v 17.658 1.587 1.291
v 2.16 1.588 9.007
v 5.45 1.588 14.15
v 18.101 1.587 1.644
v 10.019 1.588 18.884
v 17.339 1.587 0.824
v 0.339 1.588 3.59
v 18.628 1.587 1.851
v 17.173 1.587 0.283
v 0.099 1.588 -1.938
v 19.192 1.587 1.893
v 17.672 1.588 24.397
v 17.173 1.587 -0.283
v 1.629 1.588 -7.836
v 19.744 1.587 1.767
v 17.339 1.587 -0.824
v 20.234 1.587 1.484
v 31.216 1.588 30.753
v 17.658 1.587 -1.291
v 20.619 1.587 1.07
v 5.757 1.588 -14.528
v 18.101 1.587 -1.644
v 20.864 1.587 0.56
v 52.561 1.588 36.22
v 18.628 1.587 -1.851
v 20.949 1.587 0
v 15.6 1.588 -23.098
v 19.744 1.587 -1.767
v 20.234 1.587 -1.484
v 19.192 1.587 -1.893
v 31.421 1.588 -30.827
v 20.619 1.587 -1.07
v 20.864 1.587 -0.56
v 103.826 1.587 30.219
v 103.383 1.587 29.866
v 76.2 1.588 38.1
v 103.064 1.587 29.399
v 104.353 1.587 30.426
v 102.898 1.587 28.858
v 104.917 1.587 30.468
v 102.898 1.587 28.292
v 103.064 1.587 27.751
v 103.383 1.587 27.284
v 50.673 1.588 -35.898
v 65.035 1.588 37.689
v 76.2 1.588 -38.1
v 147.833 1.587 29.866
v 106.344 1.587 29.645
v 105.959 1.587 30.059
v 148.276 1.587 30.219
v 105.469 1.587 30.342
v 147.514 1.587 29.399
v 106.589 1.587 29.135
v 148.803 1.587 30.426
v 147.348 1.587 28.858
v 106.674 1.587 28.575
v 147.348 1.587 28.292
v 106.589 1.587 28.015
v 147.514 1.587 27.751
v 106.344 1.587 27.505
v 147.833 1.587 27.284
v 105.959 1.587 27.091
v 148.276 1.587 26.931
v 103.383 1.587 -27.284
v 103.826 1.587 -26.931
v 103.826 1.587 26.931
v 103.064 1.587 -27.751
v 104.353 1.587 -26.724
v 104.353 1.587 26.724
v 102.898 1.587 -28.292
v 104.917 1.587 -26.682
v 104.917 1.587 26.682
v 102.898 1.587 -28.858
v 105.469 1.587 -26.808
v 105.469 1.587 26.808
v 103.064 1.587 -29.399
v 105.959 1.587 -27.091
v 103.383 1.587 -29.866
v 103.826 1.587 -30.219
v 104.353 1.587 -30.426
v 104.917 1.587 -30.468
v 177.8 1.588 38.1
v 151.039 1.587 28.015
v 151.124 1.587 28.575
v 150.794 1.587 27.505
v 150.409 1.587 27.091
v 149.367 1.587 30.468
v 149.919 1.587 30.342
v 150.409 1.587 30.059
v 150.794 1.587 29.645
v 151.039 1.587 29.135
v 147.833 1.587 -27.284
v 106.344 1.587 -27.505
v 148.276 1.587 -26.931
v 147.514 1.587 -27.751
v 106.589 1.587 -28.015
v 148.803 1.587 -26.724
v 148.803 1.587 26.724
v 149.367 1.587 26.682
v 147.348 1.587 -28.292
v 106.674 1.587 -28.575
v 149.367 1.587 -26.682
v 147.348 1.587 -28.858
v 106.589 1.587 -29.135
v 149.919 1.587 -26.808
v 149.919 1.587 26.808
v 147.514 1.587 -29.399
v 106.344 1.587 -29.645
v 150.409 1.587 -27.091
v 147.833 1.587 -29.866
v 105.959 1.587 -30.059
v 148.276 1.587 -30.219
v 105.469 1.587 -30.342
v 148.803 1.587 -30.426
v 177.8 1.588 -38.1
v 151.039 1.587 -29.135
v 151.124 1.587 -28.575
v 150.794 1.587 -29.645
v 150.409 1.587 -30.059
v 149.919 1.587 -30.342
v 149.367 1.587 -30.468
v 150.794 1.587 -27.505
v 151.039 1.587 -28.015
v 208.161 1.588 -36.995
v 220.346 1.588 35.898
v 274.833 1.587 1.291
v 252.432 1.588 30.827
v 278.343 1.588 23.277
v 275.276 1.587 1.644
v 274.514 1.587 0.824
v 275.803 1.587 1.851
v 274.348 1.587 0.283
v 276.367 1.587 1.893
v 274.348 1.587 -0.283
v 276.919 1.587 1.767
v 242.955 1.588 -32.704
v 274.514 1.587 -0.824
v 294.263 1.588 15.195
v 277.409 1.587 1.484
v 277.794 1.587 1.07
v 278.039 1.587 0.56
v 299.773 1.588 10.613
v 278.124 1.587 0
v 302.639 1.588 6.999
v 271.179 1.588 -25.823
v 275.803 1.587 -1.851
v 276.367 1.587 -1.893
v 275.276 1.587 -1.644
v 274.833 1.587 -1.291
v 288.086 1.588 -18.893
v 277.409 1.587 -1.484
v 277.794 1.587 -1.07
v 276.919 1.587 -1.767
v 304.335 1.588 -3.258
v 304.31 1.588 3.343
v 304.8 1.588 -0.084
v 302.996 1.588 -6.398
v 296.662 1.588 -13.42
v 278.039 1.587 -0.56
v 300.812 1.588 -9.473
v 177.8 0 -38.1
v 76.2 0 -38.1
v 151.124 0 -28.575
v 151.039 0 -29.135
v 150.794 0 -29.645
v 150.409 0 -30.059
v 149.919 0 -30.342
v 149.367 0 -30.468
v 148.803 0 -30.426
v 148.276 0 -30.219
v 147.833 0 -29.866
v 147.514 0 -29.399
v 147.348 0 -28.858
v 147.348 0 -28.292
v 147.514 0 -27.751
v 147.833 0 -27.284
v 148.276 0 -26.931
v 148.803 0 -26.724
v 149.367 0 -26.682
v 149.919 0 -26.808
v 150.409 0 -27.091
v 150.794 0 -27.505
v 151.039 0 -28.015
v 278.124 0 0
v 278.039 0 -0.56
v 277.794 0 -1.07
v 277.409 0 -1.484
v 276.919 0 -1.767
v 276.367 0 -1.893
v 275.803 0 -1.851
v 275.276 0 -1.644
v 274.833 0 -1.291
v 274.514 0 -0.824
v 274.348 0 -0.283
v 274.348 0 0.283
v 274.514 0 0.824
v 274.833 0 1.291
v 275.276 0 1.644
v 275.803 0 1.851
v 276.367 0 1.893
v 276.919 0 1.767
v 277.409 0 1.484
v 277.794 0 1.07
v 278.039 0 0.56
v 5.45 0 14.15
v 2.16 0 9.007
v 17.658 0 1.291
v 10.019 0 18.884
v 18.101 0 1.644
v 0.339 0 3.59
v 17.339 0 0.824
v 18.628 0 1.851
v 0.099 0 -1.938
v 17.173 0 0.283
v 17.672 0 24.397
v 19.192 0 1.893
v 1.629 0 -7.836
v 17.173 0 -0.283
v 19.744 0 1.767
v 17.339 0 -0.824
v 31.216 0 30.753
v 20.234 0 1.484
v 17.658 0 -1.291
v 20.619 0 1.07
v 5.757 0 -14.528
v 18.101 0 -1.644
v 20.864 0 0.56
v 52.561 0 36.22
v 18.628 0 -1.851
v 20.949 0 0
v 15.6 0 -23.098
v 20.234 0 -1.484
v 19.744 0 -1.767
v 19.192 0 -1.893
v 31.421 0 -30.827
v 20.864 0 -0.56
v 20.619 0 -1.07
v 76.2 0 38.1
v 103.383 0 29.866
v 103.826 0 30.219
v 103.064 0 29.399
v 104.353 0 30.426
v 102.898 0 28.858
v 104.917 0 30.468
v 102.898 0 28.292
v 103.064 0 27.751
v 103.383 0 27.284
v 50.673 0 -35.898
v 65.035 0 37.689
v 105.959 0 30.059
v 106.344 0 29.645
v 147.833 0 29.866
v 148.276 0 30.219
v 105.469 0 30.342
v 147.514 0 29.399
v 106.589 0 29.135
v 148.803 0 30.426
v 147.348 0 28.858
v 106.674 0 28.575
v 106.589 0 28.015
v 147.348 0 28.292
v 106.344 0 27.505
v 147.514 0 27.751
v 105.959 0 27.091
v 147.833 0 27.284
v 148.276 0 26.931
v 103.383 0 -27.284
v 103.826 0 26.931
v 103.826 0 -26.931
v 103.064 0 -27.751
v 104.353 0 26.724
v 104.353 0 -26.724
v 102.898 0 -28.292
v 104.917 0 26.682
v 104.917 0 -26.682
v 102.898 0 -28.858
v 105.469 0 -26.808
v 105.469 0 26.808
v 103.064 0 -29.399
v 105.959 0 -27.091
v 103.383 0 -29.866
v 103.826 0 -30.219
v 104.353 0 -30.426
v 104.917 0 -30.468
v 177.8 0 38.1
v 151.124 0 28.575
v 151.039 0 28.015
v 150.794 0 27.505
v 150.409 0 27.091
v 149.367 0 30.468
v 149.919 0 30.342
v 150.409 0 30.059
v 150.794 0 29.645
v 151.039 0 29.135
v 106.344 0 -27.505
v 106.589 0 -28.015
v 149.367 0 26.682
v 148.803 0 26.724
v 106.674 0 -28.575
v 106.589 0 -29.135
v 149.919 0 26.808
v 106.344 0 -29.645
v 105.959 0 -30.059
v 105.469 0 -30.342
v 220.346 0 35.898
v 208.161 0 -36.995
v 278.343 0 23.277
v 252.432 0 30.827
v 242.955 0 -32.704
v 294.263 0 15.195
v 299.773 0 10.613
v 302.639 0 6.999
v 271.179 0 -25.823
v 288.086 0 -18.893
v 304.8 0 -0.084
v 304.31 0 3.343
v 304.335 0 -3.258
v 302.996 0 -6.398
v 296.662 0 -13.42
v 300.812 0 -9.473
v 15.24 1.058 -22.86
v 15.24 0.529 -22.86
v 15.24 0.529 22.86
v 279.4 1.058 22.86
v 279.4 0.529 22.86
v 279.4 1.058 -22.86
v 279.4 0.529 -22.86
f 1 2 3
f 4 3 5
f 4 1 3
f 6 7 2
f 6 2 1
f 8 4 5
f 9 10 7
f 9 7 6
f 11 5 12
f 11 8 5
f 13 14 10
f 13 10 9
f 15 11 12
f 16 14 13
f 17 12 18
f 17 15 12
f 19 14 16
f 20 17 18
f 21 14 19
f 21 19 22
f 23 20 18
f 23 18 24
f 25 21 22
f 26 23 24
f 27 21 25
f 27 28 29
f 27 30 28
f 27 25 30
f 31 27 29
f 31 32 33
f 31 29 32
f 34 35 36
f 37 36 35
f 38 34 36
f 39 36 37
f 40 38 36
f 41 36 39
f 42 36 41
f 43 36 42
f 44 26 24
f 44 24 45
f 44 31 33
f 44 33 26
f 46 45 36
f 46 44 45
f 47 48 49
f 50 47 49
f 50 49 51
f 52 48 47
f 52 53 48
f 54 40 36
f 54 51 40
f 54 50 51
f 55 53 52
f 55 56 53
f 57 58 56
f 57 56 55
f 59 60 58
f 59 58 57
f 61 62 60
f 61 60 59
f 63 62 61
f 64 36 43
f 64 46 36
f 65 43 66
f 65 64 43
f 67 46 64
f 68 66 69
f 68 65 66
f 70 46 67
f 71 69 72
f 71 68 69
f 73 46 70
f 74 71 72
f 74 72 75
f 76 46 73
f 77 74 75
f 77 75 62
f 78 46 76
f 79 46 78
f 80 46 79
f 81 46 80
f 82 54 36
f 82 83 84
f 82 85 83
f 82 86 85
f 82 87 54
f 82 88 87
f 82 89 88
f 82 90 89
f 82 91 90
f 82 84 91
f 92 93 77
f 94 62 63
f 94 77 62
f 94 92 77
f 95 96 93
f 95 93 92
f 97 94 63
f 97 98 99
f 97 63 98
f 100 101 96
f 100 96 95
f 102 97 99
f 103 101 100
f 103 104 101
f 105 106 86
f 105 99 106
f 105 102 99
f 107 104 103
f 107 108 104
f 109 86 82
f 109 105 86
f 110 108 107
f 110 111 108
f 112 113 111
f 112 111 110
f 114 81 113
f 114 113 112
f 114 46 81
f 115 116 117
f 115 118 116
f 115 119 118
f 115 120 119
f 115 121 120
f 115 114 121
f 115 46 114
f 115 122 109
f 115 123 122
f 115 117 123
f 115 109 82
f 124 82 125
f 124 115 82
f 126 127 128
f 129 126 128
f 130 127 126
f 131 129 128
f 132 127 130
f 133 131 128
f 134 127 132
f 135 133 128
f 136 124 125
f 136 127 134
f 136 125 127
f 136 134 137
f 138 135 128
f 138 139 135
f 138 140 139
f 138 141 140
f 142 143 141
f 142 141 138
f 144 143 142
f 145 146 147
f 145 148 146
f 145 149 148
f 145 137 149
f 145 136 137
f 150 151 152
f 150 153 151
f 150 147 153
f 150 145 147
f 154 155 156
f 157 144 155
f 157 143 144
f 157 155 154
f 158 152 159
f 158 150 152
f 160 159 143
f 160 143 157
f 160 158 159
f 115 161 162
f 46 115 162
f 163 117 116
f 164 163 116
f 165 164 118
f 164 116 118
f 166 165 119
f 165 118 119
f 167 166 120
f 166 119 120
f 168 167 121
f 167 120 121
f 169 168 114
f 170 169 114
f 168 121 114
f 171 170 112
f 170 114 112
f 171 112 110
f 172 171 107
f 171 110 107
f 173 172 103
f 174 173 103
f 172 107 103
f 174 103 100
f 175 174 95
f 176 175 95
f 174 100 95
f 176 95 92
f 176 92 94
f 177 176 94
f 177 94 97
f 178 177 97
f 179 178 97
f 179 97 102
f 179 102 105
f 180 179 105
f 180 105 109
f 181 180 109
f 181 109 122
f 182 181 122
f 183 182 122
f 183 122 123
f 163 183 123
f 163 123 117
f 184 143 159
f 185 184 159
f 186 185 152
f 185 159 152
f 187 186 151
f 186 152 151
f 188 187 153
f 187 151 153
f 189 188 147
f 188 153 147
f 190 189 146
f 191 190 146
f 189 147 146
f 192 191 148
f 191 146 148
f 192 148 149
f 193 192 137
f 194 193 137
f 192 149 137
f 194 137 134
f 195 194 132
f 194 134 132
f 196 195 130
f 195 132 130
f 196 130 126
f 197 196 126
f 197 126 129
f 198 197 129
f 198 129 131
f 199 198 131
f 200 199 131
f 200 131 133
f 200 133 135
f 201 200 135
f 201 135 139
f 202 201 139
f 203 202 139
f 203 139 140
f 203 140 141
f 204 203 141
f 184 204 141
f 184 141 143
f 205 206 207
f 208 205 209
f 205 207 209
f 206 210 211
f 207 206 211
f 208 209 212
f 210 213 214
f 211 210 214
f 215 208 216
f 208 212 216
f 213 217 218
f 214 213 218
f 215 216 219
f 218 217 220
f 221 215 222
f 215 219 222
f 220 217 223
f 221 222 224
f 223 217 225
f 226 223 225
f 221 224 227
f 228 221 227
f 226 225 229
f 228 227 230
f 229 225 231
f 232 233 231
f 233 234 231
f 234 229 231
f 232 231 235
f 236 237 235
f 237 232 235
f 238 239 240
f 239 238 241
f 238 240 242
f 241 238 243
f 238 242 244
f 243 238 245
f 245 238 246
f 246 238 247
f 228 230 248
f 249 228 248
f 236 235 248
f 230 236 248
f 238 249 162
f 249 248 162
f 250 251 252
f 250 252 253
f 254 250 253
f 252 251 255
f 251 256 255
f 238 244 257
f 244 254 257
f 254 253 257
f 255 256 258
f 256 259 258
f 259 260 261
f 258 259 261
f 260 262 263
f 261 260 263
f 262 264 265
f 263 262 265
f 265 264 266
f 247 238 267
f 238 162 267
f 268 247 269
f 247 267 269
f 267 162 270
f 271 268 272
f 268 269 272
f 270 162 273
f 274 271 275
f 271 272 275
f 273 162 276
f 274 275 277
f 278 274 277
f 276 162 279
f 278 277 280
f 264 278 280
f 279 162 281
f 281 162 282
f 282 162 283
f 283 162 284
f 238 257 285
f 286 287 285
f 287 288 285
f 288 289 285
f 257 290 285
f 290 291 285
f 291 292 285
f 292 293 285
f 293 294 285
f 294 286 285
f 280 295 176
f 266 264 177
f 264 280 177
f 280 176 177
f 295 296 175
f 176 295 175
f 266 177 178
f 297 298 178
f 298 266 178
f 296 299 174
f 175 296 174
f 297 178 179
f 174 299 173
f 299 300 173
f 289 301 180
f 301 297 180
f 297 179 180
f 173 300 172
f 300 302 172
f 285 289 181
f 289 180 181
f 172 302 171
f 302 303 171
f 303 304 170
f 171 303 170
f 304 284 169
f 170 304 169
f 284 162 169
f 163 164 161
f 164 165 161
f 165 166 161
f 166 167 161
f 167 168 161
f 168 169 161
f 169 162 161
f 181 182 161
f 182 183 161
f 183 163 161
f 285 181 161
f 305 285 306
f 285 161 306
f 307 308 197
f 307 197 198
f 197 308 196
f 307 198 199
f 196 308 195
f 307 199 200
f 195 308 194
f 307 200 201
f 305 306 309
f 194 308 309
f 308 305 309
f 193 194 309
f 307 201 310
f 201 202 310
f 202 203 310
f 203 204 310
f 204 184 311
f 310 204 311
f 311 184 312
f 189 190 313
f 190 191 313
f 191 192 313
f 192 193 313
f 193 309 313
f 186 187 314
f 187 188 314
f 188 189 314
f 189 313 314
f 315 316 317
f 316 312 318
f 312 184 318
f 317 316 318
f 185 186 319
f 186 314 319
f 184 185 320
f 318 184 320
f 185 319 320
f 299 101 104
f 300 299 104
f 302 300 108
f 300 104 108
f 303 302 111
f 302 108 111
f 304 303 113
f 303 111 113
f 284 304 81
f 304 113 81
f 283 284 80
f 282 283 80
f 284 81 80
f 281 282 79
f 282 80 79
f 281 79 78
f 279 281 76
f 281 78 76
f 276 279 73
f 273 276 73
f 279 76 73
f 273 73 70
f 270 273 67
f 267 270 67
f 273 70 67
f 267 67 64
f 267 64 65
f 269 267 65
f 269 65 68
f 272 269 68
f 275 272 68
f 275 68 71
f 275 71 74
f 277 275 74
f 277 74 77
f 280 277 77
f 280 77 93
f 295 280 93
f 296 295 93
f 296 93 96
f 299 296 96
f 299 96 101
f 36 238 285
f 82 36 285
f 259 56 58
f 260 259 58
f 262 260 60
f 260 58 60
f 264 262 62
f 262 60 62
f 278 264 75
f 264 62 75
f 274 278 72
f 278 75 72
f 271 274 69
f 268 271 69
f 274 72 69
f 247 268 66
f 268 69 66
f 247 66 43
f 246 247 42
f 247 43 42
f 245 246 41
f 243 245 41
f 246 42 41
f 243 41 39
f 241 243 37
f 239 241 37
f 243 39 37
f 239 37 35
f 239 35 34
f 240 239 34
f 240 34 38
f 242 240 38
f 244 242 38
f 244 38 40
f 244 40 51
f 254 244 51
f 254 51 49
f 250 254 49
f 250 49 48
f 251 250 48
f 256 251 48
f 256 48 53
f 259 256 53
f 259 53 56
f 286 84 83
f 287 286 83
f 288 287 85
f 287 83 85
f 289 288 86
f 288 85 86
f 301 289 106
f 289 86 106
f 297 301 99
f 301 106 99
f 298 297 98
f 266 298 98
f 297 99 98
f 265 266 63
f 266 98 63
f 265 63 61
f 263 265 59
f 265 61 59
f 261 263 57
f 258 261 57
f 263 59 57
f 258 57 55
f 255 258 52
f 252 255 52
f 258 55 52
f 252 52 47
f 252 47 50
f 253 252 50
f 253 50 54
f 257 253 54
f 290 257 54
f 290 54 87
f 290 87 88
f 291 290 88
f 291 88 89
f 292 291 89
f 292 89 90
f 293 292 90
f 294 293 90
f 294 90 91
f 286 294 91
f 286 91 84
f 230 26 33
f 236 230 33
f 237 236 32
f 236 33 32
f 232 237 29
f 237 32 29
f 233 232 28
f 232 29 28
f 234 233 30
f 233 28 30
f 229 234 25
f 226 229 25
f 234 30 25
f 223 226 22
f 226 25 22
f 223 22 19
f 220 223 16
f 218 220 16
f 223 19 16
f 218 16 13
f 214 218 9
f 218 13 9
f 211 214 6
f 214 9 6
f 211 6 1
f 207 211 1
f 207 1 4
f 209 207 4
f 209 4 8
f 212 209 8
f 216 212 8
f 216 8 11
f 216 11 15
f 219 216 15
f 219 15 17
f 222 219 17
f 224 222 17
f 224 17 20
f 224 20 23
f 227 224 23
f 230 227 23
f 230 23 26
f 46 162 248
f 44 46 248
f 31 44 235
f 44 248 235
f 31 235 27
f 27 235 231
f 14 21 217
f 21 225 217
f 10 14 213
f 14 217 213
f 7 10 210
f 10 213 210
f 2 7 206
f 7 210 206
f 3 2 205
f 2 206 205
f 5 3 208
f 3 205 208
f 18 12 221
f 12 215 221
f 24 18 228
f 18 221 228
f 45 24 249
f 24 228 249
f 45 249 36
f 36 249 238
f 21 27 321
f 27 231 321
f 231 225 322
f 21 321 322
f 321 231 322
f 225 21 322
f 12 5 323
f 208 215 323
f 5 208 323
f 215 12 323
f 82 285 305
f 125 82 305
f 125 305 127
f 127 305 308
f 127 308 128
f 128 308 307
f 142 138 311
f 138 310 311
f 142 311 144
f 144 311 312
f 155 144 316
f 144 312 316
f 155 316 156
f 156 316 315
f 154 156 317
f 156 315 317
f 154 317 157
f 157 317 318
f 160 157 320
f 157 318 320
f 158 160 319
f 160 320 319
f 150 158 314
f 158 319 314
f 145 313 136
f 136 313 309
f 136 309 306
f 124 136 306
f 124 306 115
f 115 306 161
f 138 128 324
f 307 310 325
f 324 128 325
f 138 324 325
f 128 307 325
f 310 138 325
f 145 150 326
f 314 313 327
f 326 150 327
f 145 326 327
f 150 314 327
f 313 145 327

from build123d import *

# Parameters (mm, degrees)
BOSS_EXTRUDE1_DEPTH       = 1.5875
F_6_CLEARANCE_HOLE1_D     = 3.7973
F_6_CLEARANCE_HOLE2_D     = 3.7973
F_6_CLEARANCE_HOLE2_DEPTH = 25.4
F_6_CLEARANCE_HOLE2_TIP   = 1.140824014
F_6_CLEARANCE_HOLE3_D     = 3.7973
F_6_CLEARANCE_HOLE3_DEPTH = 25.4
F_6_CLEARANCE_HOLE3_TIP   = 1.140824014


with BuildPart() as part:
    # Sketch11 → Boss-Extrude1 (new body)
    with BuildSketch(Plane(origin=(0, 0, 0), x_dir=(1, 0, 0), z_dir=(0, 1, 0))):
        with BuildLine():
            Line((177.8, 38.1), (76.2, 38.1))
            add(Edge.make_bspline(
                [(76.2, 38.1), (-76.2, 38.1), (-76.2, -38.1), (76.2, -38.1)],
                knots=[0, 0, 0, 0, 1, 1, 1, 1], degree=3, weights=[1, 0.333333333, 0.333333333, 1]))
            Line((76.2, -38.1), (177.8, -38.1))
            add(Edge.make_bspline(
                [(177.8, -38.1), (431.8, -38.1), (431.8, 38.1), (177.8, 38.1)],
                knots=[0, 0, 0, 0, 1, 1, 1, 1], degree=3, weights=[1, 0.333333333, 0.333333333, 1]))
        make_face()
    extrude(amount=BOSS_EXTRUDE1_DEPTH)

    # #6 Clearance Hole1 (through all)
    with Locations(Plane(origin=(0, 0, 0), x_dir=(-1, 0, 0), z_dir=(0, -1, 0))):
        with Locations((-104.775, -28.575), (-149.225, -28.575), (-149.225, 28.575), (-104.775, 28.575)):
            Hole(F_6_CLEARANCE_HOLE1_D / 2)

    # #6 Clearance Hole2
    with Locations(Plane(origin=(0, 0, 0), x_dir=(-1, 0, 0), z_dir=(0, -1, 0))):
        with Locations((-19.05, 0)):
            Hole(F_6_CLEARANCE_HOLE2_D / 2, depth=F_6_CLEARANCE_HOLE2_DEPTH)
            with Locations((0, 0, -(F_6_CLEARANCE_HOLE2_DEPTH + F_6_CLEARANCE_HOLE2_TIP / 2))):  # 118° drill point
                Cone(0, F_6_CLEARANCE_HOLE2_D / 2, F_6_CLEARANCE_HOLE2_TIP, mode=Mode.SUBTRACT)

    # #6 Clearance Hole3
    with Locations(Plane(origin=(0, 0, 0), x_dir=(-1, 0, 0), z_dir=(0, -1, 0))):
        with Locations((-276.225, 0)):
            Hole(F_6_CLEARANCE_HOLE3_D / 2, depth=F_6_CLEARANCE_HOLE3_DEPTH)
            with Locations((0, 0, -(F_6_CLEARANCE_HOLE3_DEPTH + F_6_CLEARANCE_HOLE3_TIP / 2))):  # 118° drill point
                Cone(0, F_6_CLEARANCE_HOLE3_D / 2, F_6_CLEARANCE_HOLE3_TIP, mode=Mode.SUBTRACT)


solid = part.part
